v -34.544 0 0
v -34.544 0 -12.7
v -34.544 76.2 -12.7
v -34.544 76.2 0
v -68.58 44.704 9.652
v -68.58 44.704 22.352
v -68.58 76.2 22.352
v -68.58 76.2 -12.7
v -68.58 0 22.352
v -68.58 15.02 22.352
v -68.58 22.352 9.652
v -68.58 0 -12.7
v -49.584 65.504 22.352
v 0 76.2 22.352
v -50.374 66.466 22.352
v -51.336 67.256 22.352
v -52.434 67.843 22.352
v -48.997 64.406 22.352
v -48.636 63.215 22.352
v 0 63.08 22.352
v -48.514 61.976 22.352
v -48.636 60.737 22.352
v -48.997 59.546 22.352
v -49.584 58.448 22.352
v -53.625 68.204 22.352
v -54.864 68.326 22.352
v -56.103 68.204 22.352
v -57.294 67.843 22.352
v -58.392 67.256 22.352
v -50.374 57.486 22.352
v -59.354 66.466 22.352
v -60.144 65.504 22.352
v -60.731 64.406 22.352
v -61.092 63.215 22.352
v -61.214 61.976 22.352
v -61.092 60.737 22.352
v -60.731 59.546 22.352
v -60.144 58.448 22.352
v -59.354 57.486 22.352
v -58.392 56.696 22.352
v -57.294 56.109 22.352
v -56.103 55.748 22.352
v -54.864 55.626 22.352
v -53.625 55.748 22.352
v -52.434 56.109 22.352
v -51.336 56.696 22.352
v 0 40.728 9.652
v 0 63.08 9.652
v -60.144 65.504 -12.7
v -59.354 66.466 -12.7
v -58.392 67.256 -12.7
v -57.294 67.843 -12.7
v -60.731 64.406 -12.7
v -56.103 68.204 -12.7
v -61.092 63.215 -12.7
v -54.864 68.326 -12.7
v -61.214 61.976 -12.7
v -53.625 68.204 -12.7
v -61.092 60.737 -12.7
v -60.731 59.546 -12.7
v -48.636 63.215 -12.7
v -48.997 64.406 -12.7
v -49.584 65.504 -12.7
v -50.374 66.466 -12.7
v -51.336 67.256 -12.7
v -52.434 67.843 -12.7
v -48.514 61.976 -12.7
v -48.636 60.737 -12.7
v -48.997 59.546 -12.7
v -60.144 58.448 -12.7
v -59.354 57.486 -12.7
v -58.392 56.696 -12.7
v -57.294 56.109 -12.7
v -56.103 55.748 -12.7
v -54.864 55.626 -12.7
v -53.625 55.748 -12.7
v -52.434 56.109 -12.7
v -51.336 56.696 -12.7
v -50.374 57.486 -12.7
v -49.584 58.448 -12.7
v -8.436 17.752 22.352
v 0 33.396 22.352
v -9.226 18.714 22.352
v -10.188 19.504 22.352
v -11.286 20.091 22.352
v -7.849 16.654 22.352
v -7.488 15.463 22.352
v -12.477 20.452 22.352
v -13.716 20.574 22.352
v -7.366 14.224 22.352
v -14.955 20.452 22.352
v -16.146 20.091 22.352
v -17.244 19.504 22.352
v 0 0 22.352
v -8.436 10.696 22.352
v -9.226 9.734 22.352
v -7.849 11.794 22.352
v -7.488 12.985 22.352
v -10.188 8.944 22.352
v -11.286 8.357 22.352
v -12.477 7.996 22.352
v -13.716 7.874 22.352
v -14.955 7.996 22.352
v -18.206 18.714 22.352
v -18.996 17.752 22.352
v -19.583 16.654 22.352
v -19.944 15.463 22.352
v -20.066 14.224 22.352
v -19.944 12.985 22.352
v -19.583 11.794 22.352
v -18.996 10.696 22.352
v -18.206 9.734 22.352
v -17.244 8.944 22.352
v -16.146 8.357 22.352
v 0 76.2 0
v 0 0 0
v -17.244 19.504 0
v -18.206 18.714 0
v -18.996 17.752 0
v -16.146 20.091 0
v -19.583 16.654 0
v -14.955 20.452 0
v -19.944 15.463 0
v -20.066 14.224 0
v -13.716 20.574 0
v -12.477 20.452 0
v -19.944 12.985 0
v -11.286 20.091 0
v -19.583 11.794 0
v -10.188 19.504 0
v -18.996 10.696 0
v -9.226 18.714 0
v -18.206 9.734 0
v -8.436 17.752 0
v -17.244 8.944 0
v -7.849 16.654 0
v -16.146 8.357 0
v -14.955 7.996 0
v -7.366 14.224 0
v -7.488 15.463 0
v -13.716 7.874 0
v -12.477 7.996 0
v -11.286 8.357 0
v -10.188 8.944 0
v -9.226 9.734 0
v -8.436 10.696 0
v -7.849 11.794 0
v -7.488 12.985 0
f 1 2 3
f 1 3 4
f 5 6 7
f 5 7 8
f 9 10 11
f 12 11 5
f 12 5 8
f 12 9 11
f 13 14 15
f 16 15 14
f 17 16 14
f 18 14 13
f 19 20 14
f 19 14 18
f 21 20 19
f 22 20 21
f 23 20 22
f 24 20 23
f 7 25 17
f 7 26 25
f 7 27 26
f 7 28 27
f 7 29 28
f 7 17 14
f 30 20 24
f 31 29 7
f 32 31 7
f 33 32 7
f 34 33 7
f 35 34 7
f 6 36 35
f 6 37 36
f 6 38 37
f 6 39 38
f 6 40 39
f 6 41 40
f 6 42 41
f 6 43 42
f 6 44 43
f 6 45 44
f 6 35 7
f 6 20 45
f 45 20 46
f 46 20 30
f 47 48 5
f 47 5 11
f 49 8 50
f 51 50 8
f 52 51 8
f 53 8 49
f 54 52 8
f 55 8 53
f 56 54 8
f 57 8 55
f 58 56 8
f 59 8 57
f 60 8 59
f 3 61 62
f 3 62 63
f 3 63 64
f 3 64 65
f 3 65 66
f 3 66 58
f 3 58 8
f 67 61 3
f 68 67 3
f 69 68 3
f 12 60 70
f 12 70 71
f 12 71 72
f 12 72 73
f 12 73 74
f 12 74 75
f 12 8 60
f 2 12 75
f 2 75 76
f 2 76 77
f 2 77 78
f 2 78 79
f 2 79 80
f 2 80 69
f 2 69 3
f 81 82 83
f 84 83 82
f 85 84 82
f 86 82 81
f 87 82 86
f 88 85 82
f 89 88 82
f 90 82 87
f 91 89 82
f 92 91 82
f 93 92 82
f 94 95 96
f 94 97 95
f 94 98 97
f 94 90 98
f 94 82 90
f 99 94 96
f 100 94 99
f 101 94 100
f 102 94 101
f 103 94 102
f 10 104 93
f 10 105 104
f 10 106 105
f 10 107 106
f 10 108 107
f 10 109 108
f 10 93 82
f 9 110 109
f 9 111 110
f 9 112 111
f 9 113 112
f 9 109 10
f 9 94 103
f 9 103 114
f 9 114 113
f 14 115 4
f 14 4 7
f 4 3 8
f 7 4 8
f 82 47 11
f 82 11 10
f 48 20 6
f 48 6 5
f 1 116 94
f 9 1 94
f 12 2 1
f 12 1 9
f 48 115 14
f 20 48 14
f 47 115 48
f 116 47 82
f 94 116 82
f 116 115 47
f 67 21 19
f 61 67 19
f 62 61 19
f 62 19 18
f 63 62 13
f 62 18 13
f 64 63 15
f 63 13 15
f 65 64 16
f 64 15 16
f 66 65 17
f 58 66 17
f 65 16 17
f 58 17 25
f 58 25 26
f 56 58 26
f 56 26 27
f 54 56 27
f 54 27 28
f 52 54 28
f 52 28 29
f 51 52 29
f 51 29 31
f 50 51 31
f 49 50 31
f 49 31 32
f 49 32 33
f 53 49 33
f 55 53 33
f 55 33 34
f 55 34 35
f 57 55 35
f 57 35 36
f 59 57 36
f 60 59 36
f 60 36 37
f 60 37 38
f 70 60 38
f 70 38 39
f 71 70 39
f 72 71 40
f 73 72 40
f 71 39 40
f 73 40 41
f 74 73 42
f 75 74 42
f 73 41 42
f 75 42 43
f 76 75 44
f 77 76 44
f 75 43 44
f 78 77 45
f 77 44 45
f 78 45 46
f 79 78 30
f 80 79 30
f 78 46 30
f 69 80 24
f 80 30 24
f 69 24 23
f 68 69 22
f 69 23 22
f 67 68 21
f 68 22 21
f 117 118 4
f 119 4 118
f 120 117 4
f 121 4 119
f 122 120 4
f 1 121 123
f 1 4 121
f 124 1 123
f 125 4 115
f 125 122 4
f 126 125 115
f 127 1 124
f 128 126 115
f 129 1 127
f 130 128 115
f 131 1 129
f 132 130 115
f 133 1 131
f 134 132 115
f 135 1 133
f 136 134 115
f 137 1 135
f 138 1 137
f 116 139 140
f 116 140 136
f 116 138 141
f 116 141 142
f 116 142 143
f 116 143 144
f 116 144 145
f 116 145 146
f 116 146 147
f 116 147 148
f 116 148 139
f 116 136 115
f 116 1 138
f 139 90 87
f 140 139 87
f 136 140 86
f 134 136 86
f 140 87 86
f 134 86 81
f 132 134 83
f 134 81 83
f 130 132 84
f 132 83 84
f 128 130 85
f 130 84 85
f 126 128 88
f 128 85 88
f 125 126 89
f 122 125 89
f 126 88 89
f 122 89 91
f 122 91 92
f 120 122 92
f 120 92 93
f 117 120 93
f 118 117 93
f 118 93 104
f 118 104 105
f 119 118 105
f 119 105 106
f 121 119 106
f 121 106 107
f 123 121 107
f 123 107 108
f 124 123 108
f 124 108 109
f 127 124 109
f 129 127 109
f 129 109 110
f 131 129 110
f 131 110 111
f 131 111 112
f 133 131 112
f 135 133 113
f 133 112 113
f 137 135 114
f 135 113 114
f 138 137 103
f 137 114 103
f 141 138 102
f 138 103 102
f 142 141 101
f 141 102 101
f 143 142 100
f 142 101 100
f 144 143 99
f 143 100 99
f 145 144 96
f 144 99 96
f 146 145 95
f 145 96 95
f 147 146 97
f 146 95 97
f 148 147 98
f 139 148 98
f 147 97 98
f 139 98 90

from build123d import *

# Parameters (mm, degrees)
BOSS_EXTRUDE1_DEPTH = 76.2
CUT_EXTRUDE1_DEPTH  = 72.034516633
SKETCH5_R           = 6.35
CUT_EXTRUDE2_DEPTH  = 36.052


with BuildPart() as part:
    # Sketch1 → Boss-Extrude1 (new body)
    with BuildSketch(Plane(origin=(0, 0, 0), x_dir=(1, 0, 0), z_dir=(0, 1, 0))):
        Polygon((0, 0), (0, -22.352), (-68.58, -22.352), (-68.58, 12.7), (-34.544, 12.7), (-34.544, 0), align=None)
    extrude(amount=BOSS_EXTRUDE1_DEPTH)

    # Sketch2 → Cut-Extrude1 (cut, through all, along a direction that is not the sketch's normal)
    with BuildSketch(Plane.ZY.offset(68.58)):
        Polygon((22.352, 44.704), (9.652, 44.704), (9.652, 22.352), (22.352, 15.019651581), align=None)
    extrude(amount=-CUT_EXTRUDE1_DEPTH, dir=(-0.965925826, -0.258819045, 0), mode=Mode.SUBTRACT)

    # Sketch5 → Cut-Extrude2 (cut, through all)
    with BuildSketch(Plane.XY.offset(22.352)):
        with Locations((-54.864, 61.976)):
            Circle(SKETCH5_R)
        with Locations((-13.716, 14.224)):
            Circle(SKETCH5_R)
    extrude(amount=-CUT_EXTRUDE2_DEPTH, mode=Mode.SUBTRACT)


solid = part.part
